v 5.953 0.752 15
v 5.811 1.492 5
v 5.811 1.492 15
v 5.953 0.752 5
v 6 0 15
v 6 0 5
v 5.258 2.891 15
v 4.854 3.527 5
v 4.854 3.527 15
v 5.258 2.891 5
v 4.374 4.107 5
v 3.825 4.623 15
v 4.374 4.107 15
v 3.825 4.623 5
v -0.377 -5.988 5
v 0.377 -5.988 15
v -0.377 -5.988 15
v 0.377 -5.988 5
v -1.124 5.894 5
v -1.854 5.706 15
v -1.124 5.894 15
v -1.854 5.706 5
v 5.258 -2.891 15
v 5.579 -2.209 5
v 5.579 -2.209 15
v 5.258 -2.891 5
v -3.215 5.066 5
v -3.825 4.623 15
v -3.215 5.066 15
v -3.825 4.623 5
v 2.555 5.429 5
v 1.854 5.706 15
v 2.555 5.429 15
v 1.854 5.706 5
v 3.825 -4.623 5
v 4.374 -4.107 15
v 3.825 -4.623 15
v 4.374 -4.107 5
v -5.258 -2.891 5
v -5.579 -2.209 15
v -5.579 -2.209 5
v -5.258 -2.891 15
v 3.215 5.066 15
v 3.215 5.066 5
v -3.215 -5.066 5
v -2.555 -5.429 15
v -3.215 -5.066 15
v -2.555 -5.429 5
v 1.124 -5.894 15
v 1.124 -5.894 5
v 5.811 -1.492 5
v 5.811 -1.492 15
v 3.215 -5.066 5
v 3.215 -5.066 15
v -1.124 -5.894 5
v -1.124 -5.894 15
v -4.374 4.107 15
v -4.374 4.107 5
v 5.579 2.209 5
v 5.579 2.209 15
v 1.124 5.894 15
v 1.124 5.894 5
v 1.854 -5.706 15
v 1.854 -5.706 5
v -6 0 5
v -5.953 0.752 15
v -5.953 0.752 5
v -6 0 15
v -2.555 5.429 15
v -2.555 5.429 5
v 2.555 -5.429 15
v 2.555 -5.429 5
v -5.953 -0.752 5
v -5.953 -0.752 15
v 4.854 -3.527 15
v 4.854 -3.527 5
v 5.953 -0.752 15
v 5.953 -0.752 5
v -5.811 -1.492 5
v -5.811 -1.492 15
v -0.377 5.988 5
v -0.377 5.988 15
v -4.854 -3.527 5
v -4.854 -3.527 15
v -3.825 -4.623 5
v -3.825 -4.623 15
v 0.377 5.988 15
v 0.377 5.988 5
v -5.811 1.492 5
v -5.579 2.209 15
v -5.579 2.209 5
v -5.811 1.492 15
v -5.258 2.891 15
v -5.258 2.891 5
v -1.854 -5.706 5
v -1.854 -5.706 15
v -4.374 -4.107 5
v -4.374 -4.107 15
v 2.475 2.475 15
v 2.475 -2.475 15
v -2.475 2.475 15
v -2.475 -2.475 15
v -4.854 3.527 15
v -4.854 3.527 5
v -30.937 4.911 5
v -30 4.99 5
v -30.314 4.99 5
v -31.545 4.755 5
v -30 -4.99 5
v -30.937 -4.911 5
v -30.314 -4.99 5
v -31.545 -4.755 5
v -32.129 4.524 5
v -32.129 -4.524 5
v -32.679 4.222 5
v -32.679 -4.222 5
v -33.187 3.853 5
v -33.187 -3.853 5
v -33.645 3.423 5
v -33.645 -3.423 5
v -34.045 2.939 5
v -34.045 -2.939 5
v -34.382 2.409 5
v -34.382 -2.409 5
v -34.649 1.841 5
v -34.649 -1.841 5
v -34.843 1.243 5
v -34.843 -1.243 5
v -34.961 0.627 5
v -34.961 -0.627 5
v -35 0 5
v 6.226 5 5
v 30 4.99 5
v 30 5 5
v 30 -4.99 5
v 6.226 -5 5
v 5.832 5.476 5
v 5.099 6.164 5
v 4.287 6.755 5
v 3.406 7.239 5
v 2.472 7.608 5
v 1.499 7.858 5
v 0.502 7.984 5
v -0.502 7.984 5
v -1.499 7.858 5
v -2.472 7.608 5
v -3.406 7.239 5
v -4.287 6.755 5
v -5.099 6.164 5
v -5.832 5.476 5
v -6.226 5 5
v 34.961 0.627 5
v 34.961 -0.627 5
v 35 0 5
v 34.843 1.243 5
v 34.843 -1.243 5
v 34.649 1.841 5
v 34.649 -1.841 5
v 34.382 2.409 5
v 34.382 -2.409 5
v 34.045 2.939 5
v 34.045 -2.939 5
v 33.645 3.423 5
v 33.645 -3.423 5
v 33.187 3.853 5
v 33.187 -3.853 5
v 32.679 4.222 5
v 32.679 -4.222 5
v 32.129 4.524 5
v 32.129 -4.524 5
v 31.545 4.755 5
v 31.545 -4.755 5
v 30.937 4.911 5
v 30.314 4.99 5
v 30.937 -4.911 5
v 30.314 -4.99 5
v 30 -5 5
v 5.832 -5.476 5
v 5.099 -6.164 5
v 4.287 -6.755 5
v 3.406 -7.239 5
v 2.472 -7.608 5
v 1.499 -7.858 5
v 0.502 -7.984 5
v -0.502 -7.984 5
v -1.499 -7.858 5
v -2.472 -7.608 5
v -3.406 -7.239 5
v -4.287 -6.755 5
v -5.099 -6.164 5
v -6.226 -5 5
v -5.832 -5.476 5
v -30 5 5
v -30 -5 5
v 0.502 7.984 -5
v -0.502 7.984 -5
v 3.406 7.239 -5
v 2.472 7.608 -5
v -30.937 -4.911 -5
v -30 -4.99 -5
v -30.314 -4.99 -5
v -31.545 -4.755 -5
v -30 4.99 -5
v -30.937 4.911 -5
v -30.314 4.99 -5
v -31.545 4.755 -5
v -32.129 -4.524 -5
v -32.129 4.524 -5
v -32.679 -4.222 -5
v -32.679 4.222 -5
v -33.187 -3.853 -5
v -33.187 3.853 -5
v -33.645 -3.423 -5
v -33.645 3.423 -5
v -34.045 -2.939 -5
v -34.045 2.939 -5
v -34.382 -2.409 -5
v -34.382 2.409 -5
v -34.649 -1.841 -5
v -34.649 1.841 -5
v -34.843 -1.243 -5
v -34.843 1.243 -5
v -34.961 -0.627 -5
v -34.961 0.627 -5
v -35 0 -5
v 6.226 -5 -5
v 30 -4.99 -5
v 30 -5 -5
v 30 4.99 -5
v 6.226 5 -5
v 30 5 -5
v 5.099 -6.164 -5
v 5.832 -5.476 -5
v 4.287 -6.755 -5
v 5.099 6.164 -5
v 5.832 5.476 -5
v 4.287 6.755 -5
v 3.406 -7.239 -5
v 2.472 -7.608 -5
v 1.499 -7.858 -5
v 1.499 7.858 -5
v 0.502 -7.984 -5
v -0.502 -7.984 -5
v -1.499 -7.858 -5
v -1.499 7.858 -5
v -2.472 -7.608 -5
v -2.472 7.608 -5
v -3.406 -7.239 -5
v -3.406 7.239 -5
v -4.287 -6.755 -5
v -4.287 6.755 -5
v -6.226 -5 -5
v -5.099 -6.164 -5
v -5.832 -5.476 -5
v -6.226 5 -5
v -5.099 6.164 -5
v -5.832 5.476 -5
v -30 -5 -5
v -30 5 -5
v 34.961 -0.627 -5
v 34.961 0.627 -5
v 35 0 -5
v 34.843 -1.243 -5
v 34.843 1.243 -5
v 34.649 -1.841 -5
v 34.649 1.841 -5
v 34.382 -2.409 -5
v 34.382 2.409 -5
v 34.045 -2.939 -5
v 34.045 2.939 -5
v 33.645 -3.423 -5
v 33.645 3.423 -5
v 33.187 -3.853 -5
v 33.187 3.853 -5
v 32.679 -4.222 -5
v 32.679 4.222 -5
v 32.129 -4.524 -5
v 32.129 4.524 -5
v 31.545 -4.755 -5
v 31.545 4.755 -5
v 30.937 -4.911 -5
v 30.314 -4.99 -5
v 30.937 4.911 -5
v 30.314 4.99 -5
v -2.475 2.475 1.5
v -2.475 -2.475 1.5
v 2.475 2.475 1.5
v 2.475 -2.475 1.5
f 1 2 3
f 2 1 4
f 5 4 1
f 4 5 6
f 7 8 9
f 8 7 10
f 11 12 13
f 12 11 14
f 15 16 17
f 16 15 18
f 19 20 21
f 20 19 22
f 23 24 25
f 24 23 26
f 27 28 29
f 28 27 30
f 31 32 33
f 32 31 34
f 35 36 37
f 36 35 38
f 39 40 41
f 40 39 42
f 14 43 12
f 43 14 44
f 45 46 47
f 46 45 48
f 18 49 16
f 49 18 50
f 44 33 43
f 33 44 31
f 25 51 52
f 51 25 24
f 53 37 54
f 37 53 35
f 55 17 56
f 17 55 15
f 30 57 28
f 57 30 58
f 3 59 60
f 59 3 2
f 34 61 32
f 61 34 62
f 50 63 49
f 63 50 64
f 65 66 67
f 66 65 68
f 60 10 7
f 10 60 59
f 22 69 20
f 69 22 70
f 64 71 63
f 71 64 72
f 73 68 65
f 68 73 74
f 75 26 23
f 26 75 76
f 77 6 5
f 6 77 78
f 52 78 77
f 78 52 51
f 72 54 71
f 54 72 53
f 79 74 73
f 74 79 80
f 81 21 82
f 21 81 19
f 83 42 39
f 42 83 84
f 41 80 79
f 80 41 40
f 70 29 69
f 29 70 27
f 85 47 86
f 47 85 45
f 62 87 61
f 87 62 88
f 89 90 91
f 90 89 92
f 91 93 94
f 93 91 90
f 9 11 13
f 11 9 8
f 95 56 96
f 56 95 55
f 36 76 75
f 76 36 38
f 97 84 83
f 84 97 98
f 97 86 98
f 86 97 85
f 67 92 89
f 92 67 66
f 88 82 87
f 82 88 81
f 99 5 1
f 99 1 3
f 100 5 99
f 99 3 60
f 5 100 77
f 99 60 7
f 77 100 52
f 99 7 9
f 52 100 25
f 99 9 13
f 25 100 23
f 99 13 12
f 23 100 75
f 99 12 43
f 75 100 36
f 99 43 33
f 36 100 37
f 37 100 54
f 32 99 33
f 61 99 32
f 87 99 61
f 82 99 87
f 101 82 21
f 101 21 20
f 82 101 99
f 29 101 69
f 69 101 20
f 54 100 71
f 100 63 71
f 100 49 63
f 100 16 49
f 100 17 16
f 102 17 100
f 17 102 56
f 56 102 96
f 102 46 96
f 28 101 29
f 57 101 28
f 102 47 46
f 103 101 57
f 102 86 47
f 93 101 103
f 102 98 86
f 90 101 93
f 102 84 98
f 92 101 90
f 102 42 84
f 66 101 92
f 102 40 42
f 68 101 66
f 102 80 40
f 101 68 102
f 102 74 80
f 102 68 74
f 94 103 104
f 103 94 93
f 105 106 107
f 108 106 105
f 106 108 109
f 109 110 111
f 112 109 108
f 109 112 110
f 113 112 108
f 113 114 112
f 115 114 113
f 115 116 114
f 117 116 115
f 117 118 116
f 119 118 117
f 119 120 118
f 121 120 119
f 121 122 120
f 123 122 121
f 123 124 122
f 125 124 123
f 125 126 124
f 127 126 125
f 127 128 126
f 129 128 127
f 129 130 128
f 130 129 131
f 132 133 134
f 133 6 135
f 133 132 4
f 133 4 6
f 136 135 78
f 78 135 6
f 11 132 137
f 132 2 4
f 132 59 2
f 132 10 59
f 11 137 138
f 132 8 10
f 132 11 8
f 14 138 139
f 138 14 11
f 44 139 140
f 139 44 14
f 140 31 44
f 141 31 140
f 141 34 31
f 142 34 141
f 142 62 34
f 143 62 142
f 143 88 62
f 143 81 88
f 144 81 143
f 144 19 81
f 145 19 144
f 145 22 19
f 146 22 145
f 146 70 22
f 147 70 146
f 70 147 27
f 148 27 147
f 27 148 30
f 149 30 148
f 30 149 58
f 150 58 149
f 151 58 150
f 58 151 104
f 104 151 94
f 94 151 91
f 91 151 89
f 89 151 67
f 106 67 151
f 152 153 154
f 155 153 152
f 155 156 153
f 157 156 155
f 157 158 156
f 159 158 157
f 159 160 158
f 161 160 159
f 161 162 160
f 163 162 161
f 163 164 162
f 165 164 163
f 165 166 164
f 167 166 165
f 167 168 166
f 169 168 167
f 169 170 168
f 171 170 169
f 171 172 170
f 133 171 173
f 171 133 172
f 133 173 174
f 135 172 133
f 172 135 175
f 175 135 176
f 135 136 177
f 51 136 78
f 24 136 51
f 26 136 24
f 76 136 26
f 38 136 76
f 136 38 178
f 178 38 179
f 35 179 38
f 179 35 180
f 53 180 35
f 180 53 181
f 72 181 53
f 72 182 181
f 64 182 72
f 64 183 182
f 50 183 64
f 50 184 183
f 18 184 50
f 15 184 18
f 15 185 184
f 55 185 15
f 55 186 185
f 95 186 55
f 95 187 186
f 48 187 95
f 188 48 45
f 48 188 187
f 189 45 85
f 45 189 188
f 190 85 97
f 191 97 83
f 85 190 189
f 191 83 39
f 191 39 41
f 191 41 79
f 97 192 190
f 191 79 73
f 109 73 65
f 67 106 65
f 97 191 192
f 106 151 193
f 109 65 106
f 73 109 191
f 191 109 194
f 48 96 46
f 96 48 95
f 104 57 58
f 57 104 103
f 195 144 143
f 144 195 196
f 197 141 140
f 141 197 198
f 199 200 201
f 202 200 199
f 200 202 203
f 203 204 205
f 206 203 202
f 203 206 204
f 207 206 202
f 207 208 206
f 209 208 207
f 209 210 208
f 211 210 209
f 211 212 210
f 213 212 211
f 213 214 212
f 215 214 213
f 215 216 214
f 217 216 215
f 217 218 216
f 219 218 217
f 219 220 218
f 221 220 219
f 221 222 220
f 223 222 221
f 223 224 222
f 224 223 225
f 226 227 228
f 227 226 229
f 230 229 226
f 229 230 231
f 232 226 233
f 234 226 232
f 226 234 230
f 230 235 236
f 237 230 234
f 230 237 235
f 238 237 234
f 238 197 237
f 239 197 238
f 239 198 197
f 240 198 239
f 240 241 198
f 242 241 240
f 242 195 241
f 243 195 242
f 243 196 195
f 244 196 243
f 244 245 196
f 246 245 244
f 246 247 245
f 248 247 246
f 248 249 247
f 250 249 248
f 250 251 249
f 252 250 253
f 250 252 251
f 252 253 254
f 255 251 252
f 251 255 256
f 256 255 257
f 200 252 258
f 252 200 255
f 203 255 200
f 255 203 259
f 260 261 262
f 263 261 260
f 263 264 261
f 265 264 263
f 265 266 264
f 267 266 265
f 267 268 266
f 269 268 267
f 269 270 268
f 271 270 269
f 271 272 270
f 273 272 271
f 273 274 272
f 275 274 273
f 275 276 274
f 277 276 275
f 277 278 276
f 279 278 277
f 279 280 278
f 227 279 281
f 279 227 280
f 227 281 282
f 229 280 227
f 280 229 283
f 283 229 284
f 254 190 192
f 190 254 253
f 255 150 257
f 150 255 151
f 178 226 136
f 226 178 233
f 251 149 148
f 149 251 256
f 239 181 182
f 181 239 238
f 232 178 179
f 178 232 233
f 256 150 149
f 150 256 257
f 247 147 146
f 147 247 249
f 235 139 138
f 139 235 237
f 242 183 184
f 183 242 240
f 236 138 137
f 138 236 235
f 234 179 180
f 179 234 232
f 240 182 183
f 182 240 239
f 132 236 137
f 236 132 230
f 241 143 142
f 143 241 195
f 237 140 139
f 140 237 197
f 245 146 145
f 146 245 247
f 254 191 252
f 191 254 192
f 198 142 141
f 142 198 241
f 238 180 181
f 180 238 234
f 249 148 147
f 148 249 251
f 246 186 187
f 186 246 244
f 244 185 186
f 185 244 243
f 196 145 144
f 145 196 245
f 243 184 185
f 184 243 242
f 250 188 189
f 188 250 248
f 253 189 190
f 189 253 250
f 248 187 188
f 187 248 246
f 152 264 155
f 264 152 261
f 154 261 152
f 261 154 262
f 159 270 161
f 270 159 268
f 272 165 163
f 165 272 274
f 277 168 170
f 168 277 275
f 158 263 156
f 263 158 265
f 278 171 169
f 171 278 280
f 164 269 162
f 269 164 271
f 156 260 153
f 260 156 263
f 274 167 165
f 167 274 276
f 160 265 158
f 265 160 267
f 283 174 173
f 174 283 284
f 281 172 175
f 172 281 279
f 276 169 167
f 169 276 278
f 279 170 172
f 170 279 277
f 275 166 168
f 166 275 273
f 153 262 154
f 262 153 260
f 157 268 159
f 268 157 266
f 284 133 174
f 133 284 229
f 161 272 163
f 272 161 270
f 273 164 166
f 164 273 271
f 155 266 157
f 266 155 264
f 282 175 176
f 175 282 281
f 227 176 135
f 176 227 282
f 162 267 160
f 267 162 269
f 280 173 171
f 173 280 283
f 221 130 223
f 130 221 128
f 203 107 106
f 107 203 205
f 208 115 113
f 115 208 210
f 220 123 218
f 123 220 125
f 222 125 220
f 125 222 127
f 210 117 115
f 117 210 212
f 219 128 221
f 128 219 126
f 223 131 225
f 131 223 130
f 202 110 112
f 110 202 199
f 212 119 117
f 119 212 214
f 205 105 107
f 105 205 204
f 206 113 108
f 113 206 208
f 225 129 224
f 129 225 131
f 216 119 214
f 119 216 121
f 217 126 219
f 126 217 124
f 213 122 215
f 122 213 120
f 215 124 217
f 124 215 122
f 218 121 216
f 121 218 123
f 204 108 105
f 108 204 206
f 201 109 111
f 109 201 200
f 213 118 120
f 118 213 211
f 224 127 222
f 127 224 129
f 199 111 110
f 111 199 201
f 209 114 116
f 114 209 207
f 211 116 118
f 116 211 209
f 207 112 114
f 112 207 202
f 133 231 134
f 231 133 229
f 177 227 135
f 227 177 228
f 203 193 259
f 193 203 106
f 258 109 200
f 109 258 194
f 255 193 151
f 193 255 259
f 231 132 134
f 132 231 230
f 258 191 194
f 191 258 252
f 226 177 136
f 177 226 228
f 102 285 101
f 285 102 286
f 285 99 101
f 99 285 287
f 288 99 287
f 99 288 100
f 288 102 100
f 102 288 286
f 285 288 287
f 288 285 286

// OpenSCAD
// customizable tool handle v2
// discostu http://www.thingiverse.com/discostu/about

// Hole number of sides (Triangle, Square, Hexagonal)
number_sides = 4; //[3:traingle,4:square,6:hex] 

// Tool adapter hole size (mm*100)
radius_hole = 350;

// top cylinder (mm*100)
top_center_radious = 600;

// bottom cylindre (mm*100)
bottom_centre_radious = 800; 

// x axis tool length (mm*10)
x_tool_length = 600;

// y axis tool length (mm*10)
y_tool_length = 50;

// Base and hole substraction
difference(){
    base();
    translate([0,0,10]) rotate([0,0,45]) cylinder(17,radius_hole/100,radius_hole/100, $fn=number_sides, center = true);
}

module base(){
    union(){
        //top center cylinder
        translate([0,0,10]) cylinder(10,top_center_radious/100,top_center_radious/100,$fn=50, center = true);
        //bottom center cylinder
        cylinder(10,bottom_centre_radious/100,bottom_centre_radious/100,$fn=50,center = true);
        
        //x lateral cylinders
        translate([x_tool_length/20,0,0]) cylinder(10,5,5, $fn=50,center = true);
        translate([-x_tool_length/20,0,0]) cylinder(10,5,5, $fn=50,center = true);
        //x tool body
        cube([x_tool_length/10,10,10],center = true);
        
        //y lateral cylinders
        translate([0,y_tool_length/20,0]) cylinder(10,5,5, $fn=50,center = true);
        translate([0,-y_tool_length/20,0]) cylinder(10,5,5, $fn=50,center = true);
        //x tool body
        cube([10,y_tool_length/10,10],center = true);
    }
}
